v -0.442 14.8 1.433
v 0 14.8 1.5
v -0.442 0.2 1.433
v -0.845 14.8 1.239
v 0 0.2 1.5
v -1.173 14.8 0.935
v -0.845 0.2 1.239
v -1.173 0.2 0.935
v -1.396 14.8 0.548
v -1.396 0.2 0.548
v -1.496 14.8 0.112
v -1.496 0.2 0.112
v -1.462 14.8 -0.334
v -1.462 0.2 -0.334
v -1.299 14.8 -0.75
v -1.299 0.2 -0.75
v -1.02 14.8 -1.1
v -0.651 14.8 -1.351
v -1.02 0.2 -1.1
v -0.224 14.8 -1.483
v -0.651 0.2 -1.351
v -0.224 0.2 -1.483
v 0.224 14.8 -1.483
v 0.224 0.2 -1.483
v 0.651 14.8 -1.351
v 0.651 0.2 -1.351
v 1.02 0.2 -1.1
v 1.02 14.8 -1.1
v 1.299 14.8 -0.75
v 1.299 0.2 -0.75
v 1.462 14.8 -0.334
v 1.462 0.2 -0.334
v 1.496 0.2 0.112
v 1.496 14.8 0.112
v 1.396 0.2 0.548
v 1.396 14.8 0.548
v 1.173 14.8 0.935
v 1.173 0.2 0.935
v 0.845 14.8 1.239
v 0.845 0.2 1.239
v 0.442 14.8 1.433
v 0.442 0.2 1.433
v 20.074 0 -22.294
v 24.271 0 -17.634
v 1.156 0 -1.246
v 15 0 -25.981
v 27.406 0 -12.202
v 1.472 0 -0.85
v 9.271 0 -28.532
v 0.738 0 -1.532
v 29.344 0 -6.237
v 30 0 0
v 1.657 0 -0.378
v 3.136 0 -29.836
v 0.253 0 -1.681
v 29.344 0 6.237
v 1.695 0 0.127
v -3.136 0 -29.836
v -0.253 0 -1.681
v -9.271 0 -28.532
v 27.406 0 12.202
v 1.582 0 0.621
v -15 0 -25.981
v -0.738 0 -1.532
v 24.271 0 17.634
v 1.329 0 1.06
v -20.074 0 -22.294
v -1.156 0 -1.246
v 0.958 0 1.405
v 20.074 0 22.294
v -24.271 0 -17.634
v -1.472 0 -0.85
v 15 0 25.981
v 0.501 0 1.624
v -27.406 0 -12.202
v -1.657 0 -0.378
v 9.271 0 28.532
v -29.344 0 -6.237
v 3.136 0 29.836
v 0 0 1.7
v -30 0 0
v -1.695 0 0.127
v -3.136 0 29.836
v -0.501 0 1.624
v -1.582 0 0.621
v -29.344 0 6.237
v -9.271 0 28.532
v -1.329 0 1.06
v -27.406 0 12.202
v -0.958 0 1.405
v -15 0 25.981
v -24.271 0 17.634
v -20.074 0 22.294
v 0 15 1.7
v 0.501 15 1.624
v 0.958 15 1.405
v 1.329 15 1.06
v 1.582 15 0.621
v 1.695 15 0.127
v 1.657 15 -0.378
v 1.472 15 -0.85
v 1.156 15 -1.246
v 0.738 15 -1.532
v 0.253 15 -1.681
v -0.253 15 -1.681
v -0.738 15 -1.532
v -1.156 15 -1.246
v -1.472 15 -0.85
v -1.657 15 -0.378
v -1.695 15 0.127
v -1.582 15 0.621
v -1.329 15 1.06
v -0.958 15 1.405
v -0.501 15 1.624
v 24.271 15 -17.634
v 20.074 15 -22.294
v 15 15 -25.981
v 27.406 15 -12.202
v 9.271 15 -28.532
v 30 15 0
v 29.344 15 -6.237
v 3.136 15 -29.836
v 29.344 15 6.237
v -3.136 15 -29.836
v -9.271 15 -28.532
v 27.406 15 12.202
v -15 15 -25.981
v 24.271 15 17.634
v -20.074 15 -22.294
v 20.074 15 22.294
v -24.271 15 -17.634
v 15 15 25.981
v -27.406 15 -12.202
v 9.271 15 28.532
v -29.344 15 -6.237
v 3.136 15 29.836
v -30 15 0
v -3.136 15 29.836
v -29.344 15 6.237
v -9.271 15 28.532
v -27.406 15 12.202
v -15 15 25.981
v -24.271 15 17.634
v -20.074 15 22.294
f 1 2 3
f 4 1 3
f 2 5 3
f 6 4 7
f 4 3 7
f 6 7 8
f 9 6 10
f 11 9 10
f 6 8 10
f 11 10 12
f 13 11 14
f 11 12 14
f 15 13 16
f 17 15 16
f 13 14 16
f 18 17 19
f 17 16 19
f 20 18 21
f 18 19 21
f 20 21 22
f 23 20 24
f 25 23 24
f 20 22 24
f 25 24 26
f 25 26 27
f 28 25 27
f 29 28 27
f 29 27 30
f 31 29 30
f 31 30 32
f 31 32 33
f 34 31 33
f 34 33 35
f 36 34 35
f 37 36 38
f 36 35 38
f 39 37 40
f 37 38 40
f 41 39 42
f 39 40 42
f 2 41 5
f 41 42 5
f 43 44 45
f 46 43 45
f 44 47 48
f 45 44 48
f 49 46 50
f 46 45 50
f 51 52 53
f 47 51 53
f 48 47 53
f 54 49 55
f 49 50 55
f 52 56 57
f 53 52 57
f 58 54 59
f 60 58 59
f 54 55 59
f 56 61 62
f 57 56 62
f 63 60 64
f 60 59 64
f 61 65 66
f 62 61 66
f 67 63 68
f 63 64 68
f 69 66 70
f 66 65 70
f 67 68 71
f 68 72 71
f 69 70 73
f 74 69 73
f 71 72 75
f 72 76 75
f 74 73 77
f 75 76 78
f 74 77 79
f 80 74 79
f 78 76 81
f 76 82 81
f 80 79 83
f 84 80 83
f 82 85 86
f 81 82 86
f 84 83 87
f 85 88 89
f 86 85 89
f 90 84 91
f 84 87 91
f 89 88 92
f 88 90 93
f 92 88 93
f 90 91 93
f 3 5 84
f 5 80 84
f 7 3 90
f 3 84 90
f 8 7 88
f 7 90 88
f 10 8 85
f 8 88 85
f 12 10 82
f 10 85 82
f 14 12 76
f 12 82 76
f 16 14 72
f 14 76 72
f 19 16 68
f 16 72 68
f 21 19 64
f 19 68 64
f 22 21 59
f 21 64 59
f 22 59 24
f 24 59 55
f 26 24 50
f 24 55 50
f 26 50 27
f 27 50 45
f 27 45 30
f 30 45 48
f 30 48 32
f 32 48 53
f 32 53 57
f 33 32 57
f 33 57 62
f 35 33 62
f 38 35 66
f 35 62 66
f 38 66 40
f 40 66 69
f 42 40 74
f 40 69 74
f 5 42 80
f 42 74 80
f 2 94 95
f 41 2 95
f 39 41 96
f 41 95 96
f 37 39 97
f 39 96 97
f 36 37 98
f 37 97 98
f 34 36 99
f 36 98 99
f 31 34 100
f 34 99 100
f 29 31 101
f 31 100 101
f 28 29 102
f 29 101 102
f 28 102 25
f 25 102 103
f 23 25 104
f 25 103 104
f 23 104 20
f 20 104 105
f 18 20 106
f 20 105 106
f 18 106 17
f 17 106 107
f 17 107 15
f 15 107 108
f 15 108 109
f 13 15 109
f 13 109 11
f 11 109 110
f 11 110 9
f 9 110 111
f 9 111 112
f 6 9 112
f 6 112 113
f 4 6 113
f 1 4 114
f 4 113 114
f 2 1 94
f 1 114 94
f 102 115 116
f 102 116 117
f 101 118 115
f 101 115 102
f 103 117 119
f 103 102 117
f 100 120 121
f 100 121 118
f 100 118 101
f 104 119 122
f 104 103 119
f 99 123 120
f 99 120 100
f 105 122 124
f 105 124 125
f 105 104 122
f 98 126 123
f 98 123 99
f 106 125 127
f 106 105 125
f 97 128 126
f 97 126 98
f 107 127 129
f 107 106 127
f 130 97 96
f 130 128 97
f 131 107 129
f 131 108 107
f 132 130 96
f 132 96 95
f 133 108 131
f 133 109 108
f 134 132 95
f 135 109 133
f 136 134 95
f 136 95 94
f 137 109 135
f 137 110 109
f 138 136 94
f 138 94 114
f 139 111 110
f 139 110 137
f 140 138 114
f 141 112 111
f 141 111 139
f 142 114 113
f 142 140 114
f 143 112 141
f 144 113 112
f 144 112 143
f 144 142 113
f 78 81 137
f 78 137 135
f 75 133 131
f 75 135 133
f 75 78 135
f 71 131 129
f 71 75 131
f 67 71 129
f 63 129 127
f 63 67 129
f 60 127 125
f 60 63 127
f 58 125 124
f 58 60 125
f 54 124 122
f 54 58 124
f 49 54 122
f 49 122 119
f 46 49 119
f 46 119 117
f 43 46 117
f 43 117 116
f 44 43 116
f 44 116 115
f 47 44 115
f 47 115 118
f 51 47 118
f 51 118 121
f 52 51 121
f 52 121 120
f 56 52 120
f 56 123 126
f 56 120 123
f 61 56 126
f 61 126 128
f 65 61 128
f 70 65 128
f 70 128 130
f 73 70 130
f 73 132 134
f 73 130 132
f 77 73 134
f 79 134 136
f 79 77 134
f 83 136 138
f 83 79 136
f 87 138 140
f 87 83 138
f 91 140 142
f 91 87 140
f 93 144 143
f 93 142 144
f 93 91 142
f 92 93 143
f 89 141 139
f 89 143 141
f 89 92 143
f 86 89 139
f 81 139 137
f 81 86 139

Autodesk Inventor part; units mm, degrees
ref_plane "YZ Plane" through (0, 0, 0) normal (1, 0, 0) x (0, 1, 0)
ref_plane "XZ Plane" through (0, 0, 0) normal (0, 1, 0) x (-1, 0, 0)
ref_plane "XY Plane" through (0, 0, 0) normal (0, 0, 1) x (1, 0, 0)
sketch "Szkic1" plane through (0, 0, 0) normal (0, 1, 0) x (-1, 0, 0)
  circle A0 centre (0, 0) radius 30
  dimension "d0" = 60
extrude "Wyciągnięcie proste1" add sketch "Szkic1" along normal blind 15
sketch "Szkic2" plane through (0, 15, 0) normal (0, 1, 0) x (1, 0, 0)
  circle A0 centre (0, 0) radius 30 projected
  circle A1 centre (0, 0) radius 1.5
  dimension "d3" = 3
hole "Otwór1" at (0, 15, 0) direction (0, -1, 0) diameter 3 depth 15 tip angle 118
chamfer "Faza1" distance 0.2 angle 45 1 edges at (0, 15, -1.5)
chamfer "Faza2" distance 0.2 angle 45 1 edges at (0, 0, -1.5)
properties part number "koło" material "Żywica acetalowa, czarna"
